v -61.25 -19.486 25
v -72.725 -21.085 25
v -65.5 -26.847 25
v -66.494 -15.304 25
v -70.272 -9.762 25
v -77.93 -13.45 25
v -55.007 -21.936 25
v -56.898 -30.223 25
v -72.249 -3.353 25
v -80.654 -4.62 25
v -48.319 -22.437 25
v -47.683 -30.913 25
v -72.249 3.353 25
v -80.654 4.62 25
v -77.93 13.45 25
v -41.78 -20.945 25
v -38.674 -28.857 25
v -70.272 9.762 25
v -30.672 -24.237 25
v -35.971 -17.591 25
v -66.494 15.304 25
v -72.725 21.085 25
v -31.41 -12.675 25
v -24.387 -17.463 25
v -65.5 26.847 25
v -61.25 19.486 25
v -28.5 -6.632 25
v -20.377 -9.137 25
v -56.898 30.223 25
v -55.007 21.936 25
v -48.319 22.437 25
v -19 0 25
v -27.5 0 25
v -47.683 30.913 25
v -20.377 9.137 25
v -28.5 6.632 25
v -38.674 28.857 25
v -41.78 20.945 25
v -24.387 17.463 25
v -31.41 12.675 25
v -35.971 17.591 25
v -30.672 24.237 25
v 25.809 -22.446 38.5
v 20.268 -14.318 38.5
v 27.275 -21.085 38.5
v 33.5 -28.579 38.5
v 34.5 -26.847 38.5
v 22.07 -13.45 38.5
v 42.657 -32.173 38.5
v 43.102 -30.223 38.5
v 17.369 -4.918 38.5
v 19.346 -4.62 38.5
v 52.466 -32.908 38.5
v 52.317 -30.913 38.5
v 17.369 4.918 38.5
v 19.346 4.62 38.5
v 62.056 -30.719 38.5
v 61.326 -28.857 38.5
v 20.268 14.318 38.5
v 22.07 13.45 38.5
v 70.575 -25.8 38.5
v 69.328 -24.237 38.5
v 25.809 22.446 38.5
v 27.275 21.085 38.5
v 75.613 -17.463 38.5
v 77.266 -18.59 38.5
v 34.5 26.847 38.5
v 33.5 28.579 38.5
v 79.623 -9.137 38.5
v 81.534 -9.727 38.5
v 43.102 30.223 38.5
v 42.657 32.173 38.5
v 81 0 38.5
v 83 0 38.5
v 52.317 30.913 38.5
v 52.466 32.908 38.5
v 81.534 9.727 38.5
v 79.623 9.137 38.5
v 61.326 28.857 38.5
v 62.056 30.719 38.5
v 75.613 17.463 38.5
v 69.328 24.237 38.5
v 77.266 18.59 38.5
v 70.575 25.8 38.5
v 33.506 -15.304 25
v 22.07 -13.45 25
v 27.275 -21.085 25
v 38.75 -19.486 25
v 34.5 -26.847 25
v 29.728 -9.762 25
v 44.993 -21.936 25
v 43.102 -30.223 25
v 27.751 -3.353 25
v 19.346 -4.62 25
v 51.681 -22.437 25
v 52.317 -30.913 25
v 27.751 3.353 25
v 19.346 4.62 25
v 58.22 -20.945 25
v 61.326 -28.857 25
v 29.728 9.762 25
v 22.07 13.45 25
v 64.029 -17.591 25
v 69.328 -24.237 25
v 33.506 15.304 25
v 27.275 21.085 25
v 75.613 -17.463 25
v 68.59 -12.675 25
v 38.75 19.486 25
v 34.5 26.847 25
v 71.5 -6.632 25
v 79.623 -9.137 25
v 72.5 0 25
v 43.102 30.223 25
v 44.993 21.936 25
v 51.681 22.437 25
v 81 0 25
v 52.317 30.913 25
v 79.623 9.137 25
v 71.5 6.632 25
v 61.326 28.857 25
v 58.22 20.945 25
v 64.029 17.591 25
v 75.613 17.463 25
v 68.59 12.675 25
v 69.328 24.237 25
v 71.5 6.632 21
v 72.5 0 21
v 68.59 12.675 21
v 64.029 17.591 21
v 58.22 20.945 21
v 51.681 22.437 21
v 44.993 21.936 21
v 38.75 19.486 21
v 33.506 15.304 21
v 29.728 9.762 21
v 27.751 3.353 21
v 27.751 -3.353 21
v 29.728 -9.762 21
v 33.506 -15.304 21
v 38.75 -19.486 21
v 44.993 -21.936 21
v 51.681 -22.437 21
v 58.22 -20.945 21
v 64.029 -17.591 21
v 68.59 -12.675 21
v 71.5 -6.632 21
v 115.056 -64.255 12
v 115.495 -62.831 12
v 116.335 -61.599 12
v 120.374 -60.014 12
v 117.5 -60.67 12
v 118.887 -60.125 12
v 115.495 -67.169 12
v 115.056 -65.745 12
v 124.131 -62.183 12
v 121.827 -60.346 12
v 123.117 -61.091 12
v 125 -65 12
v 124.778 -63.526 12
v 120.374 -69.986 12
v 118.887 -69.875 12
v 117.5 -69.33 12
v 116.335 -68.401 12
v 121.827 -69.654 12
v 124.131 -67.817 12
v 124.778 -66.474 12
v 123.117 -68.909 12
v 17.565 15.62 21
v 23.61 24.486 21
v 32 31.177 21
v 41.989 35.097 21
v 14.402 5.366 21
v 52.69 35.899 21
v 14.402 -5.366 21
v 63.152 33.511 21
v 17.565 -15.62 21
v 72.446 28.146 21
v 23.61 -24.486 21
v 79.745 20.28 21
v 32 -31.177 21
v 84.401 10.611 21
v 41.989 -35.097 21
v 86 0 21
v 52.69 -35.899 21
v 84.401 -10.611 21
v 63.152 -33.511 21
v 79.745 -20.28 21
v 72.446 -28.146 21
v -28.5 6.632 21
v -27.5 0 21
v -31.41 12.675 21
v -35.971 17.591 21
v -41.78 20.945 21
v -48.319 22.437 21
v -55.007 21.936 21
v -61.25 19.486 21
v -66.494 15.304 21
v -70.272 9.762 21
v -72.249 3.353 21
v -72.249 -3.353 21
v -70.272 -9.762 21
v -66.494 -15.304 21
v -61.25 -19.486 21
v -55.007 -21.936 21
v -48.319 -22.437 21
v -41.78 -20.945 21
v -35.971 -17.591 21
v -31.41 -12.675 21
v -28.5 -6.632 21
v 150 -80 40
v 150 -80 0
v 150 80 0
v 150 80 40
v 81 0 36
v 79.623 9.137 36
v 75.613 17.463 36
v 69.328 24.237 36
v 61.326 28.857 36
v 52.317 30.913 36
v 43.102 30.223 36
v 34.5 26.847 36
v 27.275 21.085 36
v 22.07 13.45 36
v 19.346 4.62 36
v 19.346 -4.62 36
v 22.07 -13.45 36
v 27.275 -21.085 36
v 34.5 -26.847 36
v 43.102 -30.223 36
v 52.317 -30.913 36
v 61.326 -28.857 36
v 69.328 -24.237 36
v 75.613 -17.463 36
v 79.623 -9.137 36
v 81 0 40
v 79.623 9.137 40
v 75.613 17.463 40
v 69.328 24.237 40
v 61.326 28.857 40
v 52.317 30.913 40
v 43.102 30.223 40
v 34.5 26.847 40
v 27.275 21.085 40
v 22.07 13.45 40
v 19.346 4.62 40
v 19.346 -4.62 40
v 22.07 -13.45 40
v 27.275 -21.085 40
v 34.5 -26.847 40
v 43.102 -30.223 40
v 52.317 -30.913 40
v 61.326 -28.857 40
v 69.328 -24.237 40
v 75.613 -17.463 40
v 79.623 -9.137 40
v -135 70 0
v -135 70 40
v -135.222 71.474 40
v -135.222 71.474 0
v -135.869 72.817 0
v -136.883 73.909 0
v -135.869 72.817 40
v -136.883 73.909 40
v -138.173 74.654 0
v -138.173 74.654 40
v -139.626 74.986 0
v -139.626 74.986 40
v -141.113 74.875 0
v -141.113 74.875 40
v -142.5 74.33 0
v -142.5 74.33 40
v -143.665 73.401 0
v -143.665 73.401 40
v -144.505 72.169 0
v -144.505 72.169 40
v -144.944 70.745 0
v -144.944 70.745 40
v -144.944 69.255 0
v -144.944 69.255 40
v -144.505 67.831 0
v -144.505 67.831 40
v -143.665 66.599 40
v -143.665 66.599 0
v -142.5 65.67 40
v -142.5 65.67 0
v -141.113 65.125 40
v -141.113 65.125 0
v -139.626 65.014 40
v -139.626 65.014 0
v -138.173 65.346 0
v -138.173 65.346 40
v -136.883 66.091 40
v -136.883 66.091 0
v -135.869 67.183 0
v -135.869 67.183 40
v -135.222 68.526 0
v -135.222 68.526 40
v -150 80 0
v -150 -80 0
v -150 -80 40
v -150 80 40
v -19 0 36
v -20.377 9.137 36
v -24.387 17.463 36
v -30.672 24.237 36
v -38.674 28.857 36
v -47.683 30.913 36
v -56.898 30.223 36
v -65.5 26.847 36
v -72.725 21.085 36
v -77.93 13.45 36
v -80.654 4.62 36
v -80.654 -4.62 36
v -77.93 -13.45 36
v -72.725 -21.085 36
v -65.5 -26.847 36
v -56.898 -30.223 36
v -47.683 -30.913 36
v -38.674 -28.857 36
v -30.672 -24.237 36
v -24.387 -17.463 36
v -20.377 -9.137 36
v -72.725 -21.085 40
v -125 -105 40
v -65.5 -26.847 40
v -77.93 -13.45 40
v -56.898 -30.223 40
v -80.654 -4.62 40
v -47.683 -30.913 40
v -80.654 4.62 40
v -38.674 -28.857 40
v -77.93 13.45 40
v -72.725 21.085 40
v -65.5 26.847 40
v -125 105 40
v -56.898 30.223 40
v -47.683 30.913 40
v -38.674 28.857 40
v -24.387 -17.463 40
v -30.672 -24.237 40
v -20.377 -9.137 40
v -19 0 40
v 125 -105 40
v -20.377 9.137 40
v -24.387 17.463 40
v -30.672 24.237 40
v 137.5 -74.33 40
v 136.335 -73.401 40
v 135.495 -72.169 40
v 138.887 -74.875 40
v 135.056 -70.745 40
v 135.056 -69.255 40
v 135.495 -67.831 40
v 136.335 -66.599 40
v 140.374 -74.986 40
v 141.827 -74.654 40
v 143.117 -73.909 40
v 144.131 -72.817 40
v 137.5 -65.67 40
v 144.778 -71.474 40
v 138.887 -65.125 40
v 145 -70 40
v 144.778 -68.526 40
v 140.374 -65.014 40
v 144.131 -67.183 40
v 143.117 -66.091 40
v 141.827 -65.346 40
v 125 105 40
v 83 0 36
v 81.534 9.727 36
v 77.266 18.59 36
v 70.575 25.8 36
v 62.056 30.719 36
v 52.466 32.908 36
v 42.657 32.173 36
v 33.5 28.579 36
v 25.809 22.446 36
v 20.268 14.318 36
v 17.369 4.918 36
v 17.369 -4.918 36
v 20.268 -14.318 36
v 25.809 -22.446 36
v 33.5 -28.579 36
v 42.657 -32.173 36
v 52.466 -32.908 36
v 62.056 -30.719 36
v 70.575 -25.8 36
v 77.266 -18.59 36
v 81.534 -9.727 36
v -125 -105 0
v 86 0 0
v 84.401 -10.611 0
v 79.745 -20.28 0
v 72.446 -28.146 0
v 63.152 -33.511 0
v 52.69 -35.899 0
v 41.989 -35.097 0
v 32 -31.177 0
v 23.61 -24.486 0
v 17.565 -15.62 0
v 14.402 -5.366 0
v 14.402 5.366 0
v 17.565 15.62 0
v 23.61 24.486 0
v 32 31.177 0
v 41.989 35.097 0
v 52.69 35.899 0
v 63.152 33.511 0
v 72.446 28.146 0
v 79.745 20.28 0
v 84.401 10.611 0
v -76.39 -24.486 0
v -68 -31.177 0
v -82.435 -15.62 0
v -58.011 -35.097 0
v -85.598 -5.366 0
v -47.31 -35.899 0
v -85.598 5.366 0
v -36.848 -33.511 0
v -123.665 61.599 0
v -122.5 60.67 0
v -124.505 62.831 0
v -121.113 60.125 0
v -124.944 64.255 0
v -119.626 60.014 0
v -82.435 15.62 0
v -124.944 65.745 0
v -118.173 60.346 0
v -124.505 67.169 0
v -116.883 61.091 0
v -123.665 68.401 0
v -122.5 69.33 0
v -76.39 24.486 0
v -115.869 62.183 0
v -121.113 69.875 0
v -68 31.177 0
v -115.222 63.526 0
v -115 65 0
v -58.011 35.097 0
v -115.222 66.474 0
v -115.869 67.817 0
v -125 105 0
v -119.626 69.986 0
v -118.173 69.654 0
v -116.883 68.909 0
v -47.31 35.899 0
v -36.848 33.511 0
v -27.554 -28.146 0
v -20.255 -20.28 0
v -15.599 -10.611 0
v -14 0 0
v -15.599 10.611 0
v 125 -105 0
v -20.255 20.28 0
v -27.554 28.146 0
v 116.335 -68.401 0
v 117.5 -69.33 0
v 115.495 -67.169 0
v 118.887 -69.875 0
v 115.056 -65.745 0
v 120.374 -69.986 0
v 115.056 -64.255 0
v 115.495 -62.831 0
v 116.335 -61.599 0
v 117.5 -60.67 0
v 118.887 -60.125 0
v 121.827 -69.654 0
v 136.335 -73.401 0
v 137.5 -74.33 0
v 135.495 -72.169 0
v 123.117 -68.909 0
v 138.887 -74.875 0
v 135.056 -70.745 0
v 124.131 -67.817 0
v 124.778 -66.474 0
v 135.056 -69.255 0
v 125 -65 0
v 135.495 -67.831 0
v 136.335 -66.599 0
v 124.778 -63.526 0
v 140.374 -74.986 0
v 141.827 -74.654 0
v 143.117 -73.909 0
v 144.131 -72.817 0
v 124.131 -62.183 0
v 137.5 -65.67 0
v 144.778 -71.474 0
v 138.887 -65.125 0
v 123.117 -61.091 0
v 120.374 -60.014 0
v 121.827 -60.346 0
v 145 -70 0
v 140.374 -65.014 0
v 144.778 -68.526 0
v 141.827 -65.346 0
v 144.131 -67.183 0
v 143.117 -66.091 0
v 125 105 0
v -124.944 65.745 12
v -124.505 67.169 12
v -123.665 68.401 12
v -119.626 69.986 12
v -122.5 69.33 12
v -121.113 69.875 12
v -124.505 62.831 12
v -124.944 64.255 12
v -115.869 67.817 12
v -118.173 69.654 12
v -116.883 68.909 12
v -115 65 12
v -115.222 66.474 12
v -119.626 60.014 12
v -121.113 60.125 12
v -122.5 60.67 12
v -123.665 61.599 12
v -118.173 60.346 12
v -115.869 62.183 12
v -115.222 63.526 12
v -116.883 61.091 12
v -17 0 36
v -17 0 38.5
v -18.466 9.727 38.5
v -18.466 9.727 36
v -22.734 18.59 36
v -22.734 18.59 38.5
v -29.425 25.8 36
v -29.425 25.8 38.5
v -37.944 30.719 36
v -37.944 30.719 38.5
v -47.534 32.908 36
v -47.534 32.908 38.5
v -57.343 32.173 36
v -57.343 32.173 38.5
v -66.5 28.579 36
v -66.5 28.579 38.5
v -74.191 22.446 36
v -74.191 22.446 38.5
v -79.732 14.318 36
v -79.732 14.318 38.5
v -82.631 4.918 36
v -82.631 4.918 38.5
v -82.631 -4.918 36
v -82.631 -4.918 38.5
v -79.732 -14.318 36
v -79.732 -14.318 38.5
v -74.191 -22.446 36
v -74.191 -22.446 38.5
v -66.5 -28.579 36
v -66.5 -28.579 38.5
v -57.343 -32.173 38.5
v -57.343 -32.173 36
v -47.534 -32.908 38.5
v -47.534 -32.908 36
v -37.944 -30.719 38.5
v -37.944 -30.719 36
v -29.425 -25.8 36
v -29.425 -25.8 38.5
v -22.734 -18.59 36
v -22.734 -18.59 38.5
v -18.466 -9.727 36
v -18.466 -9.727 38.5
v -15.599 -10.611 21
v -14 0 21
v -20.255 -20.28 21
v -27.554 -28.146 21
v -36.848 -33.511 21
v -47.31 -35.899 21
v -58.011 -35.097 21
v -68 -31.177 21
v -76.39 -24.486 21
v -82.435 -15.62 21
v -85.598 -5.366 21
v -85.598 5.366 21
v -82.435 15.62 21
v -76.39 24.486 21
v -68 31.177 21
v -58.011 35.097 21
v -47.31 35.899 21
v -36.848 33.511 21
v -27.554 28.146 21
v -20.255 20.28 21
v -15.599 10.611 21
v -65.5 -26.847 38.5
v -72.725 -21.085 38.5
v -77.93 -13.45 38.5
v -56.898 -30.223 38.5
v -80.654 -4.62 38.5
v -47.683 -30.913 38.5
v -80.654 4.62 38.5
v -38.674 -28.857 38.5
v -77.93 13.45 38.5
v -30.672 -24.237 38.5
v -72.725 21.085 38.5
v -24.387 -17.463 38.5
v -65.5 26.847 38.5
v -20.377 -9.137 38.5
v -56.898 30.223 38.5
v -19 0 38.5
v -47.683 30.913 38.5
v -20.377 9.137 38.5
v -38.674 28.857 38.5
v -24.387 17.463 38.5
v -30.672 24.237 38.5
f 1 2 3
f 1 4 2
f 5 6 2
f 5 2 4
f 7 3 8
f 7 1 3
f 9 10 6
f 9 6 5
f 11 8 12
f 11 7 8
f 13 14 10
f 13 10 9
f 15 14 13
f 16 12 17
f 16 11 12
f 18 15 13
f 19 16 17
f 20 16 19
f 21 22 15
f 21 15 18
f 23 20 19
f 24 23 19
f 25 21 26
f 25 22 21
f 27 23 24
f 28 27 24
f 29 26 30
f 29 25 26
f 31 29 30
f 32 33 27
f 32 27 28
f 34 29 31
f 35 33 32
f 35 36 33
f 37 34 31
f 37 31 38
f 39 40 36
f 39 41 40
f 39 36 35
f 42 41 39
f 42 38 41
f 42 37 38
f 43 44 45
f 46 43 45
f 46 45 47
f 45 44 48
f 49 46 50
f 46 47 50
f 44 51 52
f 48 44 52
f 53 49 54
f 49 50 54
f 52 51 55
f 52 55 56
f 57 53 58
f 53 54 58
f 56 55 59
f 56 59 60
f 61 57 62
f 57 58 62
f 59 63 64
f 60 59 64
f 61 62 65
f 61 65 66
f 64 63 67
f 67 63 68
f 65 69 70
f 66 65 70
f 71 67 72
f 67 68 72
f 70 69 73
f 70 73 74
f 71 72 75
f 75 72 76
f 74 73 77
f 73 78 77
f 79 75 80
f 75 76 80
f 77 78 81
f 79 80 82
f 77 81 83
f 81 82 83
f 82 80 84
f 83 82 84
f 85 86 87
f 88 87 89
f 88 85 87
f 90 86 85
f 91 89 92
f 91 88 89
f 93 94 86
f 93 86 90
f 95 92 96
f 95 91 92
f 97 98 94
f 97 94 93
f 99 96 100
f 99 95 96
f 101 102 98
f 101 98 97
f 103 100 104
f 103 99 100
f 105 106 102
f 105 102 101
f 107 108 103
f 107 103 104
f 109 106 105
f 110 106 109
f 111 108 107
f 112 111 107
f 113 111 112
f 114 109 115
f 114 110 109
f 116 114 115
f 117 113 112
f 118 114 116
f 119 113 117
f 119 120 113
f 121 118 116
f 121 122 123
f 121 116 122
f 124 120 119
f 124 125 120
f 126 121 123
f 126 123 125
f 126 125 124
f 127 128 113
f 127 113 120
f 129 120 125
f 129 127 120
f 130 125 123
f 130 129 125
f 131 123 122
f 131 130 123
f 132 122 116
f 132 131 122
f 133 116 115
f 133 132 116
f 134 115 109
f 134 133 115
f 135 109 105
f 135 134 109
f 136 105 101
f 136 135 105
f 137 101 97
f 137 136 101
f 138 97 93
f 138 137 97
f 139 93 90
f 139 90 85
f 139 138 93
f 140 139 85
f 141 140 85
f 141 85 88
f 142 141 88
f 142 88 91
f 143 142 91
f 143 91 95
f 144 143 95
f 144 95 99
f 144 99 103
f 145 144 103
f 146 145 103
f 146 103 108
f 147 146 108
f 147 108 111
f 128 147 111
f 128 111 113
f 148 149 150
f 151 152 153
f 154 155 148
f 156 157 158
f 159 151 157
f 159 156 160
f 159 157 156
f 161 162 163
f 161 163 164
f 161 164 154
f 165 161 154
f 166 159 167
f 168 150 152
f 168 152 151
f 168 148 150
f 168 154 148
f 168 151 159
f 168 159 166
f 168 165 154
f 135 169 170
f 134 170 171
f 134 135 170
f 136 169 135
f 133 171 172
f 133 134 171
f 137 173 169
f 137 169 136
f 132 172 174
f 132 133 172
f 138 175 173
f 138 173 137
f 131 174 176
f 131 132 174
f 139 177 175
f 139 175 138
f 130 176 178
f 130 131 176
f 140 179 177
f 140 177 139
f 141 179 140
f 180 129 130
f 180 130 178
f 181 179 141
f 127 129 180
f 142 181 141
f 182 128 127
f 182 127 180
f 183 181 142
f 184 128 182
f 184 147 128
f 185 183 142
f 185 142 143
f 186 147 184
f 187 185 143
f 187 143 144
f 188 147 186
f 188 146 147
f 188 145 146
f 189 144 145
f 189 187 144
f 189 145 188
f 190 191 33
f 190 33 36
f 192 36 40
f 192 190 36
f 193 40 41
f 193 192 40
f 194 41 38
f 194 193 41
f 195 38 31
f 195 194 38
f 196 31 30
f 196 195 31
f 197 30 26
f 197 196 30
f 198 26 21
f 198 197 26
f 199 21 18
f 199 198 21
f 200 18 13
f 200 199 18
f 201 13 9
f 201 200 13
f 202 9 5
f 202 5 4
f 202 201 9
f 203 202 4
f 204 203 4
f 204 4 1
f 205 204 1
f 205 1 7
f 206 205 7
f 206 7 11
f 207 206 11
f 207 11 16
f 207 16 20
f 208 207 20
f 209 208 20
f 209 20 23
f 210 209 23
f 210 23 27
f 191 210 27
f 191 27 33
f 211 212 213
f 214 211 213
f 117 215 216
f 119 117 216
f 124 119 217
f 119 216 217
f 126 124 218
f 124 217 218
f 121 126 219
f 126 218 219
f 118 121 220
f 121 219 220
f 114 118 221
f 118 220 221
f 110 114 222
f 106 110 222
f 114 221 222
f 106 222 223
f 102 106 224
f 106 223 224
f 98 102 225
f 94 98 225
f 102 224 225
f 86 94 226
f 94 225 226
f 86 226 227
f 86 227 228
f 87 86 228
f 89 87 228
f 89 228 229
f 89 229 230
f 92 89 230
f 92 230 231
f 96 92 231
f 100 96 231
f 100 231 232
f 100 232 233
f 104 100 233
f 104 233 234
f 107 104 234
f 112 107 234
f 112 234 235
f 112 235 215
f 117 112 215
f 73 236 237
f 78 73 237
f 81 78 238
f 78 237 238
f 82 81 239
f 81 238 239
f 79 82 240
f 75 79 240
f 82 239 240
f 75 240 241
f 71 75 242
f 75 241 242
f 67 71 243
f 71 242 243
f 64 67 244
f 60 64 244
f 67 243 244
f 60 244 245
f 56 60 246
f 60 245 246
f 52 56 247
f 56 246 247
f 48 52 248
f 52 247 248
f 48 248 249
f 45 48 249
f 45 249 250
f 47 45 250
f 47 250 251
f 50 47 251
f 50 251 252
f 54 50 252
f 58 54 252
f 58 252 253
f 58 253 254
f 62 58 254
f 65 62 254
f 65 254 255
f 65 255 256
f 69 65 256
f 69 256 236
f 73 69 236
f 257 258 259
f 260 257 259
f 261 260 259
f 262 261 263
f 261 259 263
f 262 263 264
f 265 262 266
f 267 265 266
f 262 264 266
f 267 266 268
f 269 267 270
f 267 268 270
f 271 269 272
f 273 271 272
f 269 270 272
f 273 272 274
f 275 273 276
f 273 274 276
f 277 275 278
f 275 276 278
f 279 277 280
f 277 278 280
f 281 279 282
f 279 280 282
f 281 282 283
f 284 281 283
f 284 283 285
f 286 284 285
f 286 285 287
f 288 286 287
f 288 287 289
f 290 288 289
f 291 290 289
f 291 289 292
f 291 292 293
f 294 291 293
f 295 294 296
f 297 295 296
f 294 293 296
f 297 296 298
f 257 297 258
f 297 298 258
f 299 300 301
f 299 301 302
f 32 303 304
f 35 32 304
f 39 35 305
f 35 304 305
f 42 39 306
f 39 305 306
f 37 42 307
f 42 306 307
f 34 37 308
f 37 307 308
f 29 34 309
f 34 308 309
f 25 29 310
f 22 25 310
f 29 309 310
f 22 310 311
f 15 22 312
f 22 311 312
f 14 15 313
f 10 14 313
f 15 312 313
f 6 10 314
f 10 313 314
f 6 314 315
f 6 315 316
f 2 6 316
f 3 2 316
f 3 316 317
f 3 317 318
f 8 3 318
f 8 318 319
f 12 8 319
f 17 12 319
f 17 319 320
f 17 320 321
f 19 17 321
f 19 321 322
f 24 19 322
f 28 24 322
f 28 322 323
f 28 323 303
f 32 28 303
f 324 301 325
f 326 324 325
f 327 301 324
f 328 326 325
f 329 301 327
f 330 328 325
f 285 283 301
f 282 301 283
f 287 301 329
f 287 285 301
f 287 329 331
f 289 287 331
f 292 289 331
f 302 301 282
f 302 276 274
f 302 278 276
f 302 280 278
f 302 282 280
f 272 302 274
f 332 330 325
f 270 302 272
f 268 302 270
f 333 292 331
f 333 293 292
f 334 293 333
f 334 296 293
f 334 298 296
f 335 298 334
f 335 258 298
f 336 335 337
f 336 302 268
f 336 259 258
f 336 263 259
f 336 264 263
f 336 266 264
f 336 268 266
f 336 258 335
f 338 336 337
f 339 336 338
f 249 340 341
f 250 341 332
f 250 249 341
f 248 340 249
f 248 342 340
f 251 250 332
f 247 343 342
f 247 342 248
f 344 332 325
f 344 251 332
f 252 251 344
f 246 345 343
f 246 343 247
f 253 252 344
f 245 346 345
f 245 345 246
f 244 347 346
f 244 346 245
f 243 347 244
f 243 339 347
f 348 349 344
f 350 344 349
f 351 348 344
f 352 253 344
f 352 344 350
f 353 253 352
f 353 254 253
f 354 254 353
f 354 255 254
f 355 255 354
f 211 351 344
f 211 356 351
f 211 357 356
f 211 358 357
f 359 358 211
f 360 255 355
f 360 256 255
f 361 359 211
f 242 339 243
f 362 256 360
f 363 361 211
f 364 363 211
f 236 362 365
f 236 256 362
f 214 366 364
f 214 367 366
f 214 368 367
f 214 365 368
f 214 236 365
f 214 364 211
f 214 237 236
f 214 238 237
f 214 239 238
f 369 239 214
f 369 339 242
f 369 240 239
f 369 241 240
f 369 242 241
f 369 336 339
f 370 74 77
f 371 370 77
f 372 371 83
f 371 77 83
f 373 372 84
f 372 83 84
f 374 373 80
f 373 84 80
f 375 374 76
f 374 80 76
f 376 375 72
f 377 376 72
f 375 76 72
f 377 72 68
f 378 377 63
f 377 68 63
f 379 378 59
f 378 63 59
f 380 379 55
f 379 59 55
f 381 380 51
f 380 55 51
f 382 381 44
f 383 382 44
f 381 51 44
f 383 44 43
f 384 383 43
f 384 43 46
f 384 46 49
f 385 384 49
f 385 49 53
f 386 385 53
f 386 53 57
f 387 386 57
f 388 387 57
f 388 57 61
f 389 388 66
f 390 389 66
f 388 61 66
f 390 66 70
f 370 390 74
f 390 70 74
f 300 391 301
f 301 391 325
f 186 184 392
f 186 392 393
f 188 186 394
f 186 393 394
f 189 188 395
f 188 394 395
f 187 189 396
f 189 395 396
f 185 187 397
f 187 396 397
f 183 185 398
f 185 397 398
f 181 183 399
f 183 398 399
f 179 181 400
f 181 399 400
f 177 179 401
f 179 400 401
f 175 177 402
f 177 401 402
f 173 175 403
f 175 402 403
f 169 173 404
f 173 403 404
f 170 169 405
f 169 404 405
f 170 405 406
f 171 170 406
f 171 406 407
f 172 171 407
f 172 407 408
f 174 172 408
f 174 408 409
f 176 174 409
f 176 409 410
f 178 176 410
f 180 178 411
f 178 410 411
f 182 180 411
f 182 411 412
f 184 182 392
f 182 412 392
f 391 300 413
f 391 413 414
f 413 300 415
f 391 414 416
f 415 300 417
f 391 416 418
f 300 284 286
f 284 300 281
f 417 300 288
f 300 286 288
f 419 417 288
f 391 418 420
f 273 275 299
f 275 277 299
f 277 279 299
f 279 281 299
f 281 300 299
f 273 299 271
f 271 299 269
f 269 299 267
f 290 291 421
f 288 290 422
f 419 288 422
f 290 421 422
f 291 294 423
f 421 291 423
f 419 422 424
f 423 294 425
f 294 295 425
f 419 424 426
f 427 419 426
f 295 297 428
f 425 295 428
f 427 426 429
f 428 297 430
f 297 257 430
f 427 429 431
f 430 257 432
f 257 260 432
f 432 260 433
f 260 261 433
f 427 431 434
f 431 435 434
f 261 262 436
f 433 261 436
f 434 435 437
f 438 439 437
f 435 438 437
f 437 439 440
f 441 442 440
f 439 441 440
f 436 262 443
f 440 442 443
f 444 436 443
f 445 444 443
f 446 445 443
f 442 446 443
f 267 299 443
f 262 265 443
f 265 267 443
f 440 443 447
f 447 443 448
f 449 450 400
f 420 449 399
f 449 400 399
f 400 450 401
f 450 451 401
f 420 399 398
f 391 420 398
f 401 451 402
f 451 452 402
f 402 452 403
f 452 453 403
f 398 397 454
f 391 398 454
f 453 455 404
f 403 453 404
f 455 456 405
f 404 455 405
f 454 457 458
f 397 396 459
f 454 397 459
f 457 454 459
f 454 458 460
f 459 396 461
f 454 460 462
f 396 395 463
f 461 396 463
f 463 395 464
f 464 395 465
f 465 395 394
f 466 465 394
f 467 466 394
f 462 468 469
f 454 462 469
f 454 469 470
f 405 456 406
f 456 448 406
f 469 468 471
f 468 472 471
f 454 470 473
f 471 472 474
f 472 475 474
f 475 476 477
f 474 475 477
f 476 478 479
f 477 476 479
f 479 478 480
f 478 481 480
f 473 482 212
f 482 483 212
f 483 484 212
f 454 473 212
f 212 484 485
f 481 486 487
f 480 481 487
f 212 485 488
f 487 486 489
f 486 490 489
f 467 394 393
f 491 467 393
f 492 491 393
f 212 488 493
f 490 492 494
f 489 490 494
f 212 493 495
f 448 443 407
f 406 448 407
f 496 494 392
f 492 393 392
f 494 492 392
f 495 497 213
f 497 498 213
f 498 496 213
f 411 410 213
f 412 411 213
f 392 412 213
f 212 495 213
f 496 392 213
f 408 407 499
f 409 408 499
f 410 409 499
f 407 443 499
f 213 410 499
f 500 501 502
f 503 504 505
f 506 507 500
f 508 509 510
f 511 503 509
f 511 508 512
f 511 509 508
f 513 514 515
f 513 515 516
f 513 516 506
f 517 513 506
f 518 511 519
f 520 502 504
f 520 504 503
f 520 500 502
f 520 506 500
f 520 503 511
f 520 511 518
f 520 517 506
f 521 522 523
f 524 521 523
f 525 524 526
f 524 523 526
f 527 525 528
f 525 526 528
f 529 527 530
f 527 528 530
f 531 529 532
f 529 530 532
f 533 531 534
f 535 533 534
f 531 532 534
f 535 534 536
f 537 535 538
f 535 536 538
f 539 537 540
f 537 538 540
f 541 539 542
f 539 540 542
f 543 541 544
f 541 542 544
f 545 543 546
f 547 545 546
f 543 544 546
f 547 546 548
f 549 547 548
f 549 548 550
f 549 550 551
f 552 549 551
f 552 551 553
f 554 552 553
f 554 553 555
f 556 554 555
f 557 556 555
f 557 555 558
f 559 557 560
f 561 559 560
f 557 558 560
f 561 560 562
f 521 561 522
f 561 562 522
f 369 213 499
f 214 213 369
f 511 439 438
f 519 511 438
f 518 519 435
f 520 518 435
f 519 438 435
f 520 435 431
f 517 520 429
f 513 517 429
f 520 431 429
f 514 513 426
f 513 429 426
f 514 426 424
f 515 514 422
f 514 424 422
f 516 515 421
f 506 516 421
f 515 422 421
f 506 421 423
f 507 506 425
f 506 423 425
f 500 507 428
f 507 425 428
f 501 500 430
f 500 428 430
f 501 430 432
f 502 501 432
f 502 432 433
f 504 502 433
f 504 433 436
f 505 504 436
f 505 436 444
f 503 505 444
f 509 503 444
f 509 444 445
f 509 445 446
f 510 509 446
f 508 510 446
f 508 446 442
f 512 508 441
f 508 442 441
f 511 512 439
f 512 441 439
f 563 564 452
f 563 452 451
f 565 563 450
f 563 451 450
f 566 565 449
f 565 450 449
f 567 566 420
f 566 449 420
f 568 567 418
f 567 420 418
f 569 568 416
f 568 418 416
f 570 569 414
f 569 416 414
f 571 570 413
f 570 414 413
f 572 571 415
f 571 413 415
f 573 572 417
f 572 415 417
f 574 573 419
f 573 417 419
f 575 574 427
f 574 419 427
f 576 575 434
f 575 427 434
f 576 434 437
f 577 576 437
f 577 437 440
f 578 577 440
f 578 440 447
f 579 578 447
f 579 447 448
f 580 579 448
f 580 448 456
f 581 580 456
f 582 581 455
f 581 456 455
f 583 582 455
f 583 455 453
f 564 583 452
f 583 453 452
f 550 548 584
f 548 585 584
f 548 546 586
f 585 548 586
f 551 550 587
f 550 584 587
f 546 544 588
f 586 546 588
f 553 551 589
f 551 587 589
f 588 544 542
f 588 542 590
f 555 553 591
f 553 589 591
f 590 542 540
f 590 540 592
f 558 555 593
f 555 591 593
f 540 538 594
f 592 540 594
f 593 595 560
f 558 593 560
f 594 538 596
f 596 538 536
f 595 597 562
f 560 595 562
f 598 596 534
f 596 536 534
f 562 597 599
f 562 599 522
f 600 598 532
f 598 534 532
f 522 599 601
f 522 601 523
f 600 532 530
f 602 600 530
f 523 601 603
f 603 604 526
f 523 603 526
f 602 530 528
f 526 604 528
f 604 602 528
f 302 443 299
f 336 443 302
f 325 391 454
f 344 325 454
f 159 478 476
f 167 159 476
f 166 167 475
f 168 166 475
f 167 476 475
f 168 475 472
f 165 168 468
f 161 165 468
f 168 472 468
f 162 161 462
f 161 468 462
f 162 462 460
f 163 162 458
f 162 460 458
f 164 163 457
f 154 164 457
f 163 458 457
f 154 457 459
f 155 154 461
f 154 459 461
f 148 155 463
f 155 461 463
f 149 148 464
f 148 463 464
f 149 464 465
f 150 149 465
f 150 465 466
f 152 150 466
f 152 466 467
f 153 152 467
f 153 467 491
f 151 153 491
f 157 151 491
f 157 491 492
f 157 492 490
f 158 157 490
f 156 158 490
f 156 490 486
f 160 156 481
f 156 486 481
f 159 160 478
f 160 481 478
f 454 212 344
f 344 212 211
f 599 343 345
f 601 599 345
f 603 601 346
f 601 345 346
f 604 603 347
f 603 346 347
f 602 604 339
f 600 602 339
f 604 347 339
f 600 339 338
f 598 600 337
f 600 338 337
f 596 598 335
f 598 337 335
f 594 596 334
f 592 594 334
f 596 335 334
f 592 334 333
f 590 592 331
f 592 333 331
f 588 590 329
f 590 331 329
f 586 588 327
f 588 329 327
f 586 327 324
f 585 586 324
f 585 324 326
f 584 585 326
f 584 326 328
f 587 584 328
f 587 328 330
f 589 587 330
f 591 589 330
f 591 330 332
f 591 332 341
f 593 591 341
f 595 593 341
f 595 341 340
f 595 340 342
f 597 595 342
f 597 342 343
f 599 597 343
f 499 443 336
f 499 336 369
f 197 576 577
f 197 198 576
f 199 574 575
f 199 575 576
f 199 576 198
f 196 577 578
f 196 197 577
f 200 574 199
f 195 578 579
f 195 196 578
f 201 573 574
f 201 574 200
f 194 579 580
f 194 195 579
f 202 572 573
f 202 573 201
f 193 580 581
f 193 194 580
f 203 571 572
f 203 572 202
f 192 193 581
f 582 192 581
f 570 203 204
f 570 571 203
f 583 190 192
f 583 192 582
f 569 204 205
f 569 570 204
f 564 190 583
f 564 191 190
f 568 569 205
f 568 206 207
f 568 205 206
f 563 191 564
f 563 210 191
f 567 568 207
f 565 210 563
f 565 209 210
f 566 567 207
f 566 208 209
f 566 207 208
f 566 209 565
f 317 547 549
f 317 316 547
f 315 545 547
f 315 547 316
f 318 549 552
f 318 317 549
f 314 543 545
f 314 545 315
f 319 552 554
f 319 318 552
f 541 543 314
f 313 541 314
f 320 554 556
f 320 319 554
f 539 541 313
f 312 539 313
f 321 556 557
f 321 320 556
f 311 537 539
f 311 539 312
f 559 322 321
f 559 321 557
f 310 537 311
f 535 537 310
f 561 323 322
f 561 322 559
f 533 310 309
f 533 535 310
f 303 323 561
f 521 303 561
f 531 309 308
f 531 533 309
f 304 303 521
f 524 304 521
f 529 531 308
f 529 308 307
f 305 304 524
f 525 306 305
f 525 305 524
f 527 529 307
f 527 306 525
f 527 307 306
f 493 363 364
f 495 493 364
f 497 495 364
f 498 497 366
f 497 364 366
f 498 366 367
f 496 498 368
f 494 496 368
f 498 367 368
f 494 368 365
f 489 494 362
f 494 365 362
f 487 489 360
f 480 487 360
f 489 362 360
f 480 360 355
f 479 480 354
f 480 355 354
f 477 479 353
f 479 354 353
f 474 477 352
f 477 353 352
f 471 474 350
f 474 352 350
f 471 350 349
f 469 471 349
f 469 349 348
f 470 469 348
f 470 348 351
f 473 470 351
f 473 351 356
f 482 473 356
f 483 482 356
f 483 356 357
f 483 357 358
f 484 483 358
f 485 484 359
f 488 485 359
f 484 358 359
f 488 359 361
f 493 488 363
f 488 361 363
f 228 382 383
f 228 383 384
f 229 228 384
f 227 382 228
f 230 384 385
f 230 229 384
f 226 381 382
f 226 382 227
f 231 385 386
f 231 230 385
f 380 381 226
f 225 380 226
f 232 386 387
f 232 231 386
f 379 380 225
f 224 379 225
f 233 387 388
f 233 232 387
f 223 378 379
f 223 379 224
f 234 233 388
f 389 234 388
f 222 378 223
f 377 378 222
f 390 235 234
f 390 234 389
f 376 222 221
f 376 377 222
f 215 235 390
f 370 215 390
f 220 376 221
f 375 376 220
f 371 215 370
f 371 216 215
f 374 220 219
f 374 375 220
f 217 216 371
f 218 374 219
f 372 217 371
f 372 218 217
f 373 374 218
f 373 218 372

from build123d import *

# Parameters (mm, degrees)
F0_W      = 300
F0_H      = 210
F0_R      = 22.5
F1_DEPTH  = 40
F2_R      = 31
F2_R_2    = 22.5
F3_DEPTH  = 15
F4_R      = 36
F4_R_2    = 22.5
F5_DEPTH  = 21
F7_R      = 33
F8_DEPTH  = 2.5
F9_R      = 5
F10_DEPTH = 40
F11_SIZE  = 25
F12_R     = 5
F13_DEPTH = 12


with BuildPart() as f1:
    # F0 (on Top) → F1 (new body)
    with BuildSketch(Plane.XY):
        Rectangle(F0_W, F0_H)
        with Locations((-50, 0)):
            Circle(F0_R, mode=Mode.SUBTRACT)
        with Locations((50, 0)):
            Circle(F0_R, mode=Mode.SUBTRACT)
    extrude(amount=F1_DEPTH)

    # F2 (on face) → F3 (cut)
    with BuildSketch(Plane.XY.offset(40)):
        with Locations((-50, 0)):
            Circle(F2_R)
        with Locations((-50, 0)):
            Circle(F2_R_2, mode=Mode.SUBTRACT)
        with Locations((50, 0)):
            Circle(F2_R)
        with Locations((50, 0)):
            Circle(F2_R_2, mode=Mode.SUBTRACT)
    extrude(amount=-F3_DEPTH, mode=Mode.SUBTRACT)

    # F4 (on face) → F5 (cut)
    with BuildSketch(Plane(origin=(0, 0, 0), x_dir=(1, 0, 0), z_dir=(0, 0, -1))):
        with Locations((-50, 0)):
            Circle(F4_R)
        with Locations((-50, 0)):
            Circle(F4_R_2, mode=Mode.SUBTRACT)
        with Locations((50, 0)):
            Circle(F4_R)
        with Locations((50, 0)):
            Circle(F4_R_2, mode=Mode.SUBTRACT)
    extrude(amount=-F5_DEPTH, mode=Mode.SUBTRACT)

    # F7 (on offset) → F8 (cut)
    with BuildSketch(Plane.XY.offset(38.5)):
        with Locations((-50, 0)):
            Circle(F7_R)
        with Locations((50, 0)):
            Circle(F7_R)
    extrude(amount=-F8_DEPTH, mode=Mode.SUBTRACT)

    # F9 (on face) → F10 (cut)
    with BuildSketch(Plane.XY.offset(40)):
        with Locations((-140, 70)):
            Circle(F9_R)
        with Locations((140, -70)):
            Circle(F9_R)
    extrude(amount=-F10_DEPTH, mode=Mode.SUBTRACT)

    # F11
    f11_edges = [f1.edges().sort_by_distance(p)[0] for p in [
        (150, -105, 20),
        (-150, -105, 20),
        (150, 105, 20),
        (-150, 105, 20),
    ]]
    chamfer(f11_edges, length=F11_SIZE)

    # F12 (on face) → F13 (cut)
    with BuildSketch(Plane(origin=(0, 0, 0), x_dir=(1, 0, 0), z_dir=(0, 0, -1))):
        with Locations((120, 65)):
            Circle(F12_R)
        with Locations((-120, -65)):
            Circle(F12_R)
    extrude(amount=-F13_DEPTH, mode=Mode.SUBTRACT)


solid = f1.part
